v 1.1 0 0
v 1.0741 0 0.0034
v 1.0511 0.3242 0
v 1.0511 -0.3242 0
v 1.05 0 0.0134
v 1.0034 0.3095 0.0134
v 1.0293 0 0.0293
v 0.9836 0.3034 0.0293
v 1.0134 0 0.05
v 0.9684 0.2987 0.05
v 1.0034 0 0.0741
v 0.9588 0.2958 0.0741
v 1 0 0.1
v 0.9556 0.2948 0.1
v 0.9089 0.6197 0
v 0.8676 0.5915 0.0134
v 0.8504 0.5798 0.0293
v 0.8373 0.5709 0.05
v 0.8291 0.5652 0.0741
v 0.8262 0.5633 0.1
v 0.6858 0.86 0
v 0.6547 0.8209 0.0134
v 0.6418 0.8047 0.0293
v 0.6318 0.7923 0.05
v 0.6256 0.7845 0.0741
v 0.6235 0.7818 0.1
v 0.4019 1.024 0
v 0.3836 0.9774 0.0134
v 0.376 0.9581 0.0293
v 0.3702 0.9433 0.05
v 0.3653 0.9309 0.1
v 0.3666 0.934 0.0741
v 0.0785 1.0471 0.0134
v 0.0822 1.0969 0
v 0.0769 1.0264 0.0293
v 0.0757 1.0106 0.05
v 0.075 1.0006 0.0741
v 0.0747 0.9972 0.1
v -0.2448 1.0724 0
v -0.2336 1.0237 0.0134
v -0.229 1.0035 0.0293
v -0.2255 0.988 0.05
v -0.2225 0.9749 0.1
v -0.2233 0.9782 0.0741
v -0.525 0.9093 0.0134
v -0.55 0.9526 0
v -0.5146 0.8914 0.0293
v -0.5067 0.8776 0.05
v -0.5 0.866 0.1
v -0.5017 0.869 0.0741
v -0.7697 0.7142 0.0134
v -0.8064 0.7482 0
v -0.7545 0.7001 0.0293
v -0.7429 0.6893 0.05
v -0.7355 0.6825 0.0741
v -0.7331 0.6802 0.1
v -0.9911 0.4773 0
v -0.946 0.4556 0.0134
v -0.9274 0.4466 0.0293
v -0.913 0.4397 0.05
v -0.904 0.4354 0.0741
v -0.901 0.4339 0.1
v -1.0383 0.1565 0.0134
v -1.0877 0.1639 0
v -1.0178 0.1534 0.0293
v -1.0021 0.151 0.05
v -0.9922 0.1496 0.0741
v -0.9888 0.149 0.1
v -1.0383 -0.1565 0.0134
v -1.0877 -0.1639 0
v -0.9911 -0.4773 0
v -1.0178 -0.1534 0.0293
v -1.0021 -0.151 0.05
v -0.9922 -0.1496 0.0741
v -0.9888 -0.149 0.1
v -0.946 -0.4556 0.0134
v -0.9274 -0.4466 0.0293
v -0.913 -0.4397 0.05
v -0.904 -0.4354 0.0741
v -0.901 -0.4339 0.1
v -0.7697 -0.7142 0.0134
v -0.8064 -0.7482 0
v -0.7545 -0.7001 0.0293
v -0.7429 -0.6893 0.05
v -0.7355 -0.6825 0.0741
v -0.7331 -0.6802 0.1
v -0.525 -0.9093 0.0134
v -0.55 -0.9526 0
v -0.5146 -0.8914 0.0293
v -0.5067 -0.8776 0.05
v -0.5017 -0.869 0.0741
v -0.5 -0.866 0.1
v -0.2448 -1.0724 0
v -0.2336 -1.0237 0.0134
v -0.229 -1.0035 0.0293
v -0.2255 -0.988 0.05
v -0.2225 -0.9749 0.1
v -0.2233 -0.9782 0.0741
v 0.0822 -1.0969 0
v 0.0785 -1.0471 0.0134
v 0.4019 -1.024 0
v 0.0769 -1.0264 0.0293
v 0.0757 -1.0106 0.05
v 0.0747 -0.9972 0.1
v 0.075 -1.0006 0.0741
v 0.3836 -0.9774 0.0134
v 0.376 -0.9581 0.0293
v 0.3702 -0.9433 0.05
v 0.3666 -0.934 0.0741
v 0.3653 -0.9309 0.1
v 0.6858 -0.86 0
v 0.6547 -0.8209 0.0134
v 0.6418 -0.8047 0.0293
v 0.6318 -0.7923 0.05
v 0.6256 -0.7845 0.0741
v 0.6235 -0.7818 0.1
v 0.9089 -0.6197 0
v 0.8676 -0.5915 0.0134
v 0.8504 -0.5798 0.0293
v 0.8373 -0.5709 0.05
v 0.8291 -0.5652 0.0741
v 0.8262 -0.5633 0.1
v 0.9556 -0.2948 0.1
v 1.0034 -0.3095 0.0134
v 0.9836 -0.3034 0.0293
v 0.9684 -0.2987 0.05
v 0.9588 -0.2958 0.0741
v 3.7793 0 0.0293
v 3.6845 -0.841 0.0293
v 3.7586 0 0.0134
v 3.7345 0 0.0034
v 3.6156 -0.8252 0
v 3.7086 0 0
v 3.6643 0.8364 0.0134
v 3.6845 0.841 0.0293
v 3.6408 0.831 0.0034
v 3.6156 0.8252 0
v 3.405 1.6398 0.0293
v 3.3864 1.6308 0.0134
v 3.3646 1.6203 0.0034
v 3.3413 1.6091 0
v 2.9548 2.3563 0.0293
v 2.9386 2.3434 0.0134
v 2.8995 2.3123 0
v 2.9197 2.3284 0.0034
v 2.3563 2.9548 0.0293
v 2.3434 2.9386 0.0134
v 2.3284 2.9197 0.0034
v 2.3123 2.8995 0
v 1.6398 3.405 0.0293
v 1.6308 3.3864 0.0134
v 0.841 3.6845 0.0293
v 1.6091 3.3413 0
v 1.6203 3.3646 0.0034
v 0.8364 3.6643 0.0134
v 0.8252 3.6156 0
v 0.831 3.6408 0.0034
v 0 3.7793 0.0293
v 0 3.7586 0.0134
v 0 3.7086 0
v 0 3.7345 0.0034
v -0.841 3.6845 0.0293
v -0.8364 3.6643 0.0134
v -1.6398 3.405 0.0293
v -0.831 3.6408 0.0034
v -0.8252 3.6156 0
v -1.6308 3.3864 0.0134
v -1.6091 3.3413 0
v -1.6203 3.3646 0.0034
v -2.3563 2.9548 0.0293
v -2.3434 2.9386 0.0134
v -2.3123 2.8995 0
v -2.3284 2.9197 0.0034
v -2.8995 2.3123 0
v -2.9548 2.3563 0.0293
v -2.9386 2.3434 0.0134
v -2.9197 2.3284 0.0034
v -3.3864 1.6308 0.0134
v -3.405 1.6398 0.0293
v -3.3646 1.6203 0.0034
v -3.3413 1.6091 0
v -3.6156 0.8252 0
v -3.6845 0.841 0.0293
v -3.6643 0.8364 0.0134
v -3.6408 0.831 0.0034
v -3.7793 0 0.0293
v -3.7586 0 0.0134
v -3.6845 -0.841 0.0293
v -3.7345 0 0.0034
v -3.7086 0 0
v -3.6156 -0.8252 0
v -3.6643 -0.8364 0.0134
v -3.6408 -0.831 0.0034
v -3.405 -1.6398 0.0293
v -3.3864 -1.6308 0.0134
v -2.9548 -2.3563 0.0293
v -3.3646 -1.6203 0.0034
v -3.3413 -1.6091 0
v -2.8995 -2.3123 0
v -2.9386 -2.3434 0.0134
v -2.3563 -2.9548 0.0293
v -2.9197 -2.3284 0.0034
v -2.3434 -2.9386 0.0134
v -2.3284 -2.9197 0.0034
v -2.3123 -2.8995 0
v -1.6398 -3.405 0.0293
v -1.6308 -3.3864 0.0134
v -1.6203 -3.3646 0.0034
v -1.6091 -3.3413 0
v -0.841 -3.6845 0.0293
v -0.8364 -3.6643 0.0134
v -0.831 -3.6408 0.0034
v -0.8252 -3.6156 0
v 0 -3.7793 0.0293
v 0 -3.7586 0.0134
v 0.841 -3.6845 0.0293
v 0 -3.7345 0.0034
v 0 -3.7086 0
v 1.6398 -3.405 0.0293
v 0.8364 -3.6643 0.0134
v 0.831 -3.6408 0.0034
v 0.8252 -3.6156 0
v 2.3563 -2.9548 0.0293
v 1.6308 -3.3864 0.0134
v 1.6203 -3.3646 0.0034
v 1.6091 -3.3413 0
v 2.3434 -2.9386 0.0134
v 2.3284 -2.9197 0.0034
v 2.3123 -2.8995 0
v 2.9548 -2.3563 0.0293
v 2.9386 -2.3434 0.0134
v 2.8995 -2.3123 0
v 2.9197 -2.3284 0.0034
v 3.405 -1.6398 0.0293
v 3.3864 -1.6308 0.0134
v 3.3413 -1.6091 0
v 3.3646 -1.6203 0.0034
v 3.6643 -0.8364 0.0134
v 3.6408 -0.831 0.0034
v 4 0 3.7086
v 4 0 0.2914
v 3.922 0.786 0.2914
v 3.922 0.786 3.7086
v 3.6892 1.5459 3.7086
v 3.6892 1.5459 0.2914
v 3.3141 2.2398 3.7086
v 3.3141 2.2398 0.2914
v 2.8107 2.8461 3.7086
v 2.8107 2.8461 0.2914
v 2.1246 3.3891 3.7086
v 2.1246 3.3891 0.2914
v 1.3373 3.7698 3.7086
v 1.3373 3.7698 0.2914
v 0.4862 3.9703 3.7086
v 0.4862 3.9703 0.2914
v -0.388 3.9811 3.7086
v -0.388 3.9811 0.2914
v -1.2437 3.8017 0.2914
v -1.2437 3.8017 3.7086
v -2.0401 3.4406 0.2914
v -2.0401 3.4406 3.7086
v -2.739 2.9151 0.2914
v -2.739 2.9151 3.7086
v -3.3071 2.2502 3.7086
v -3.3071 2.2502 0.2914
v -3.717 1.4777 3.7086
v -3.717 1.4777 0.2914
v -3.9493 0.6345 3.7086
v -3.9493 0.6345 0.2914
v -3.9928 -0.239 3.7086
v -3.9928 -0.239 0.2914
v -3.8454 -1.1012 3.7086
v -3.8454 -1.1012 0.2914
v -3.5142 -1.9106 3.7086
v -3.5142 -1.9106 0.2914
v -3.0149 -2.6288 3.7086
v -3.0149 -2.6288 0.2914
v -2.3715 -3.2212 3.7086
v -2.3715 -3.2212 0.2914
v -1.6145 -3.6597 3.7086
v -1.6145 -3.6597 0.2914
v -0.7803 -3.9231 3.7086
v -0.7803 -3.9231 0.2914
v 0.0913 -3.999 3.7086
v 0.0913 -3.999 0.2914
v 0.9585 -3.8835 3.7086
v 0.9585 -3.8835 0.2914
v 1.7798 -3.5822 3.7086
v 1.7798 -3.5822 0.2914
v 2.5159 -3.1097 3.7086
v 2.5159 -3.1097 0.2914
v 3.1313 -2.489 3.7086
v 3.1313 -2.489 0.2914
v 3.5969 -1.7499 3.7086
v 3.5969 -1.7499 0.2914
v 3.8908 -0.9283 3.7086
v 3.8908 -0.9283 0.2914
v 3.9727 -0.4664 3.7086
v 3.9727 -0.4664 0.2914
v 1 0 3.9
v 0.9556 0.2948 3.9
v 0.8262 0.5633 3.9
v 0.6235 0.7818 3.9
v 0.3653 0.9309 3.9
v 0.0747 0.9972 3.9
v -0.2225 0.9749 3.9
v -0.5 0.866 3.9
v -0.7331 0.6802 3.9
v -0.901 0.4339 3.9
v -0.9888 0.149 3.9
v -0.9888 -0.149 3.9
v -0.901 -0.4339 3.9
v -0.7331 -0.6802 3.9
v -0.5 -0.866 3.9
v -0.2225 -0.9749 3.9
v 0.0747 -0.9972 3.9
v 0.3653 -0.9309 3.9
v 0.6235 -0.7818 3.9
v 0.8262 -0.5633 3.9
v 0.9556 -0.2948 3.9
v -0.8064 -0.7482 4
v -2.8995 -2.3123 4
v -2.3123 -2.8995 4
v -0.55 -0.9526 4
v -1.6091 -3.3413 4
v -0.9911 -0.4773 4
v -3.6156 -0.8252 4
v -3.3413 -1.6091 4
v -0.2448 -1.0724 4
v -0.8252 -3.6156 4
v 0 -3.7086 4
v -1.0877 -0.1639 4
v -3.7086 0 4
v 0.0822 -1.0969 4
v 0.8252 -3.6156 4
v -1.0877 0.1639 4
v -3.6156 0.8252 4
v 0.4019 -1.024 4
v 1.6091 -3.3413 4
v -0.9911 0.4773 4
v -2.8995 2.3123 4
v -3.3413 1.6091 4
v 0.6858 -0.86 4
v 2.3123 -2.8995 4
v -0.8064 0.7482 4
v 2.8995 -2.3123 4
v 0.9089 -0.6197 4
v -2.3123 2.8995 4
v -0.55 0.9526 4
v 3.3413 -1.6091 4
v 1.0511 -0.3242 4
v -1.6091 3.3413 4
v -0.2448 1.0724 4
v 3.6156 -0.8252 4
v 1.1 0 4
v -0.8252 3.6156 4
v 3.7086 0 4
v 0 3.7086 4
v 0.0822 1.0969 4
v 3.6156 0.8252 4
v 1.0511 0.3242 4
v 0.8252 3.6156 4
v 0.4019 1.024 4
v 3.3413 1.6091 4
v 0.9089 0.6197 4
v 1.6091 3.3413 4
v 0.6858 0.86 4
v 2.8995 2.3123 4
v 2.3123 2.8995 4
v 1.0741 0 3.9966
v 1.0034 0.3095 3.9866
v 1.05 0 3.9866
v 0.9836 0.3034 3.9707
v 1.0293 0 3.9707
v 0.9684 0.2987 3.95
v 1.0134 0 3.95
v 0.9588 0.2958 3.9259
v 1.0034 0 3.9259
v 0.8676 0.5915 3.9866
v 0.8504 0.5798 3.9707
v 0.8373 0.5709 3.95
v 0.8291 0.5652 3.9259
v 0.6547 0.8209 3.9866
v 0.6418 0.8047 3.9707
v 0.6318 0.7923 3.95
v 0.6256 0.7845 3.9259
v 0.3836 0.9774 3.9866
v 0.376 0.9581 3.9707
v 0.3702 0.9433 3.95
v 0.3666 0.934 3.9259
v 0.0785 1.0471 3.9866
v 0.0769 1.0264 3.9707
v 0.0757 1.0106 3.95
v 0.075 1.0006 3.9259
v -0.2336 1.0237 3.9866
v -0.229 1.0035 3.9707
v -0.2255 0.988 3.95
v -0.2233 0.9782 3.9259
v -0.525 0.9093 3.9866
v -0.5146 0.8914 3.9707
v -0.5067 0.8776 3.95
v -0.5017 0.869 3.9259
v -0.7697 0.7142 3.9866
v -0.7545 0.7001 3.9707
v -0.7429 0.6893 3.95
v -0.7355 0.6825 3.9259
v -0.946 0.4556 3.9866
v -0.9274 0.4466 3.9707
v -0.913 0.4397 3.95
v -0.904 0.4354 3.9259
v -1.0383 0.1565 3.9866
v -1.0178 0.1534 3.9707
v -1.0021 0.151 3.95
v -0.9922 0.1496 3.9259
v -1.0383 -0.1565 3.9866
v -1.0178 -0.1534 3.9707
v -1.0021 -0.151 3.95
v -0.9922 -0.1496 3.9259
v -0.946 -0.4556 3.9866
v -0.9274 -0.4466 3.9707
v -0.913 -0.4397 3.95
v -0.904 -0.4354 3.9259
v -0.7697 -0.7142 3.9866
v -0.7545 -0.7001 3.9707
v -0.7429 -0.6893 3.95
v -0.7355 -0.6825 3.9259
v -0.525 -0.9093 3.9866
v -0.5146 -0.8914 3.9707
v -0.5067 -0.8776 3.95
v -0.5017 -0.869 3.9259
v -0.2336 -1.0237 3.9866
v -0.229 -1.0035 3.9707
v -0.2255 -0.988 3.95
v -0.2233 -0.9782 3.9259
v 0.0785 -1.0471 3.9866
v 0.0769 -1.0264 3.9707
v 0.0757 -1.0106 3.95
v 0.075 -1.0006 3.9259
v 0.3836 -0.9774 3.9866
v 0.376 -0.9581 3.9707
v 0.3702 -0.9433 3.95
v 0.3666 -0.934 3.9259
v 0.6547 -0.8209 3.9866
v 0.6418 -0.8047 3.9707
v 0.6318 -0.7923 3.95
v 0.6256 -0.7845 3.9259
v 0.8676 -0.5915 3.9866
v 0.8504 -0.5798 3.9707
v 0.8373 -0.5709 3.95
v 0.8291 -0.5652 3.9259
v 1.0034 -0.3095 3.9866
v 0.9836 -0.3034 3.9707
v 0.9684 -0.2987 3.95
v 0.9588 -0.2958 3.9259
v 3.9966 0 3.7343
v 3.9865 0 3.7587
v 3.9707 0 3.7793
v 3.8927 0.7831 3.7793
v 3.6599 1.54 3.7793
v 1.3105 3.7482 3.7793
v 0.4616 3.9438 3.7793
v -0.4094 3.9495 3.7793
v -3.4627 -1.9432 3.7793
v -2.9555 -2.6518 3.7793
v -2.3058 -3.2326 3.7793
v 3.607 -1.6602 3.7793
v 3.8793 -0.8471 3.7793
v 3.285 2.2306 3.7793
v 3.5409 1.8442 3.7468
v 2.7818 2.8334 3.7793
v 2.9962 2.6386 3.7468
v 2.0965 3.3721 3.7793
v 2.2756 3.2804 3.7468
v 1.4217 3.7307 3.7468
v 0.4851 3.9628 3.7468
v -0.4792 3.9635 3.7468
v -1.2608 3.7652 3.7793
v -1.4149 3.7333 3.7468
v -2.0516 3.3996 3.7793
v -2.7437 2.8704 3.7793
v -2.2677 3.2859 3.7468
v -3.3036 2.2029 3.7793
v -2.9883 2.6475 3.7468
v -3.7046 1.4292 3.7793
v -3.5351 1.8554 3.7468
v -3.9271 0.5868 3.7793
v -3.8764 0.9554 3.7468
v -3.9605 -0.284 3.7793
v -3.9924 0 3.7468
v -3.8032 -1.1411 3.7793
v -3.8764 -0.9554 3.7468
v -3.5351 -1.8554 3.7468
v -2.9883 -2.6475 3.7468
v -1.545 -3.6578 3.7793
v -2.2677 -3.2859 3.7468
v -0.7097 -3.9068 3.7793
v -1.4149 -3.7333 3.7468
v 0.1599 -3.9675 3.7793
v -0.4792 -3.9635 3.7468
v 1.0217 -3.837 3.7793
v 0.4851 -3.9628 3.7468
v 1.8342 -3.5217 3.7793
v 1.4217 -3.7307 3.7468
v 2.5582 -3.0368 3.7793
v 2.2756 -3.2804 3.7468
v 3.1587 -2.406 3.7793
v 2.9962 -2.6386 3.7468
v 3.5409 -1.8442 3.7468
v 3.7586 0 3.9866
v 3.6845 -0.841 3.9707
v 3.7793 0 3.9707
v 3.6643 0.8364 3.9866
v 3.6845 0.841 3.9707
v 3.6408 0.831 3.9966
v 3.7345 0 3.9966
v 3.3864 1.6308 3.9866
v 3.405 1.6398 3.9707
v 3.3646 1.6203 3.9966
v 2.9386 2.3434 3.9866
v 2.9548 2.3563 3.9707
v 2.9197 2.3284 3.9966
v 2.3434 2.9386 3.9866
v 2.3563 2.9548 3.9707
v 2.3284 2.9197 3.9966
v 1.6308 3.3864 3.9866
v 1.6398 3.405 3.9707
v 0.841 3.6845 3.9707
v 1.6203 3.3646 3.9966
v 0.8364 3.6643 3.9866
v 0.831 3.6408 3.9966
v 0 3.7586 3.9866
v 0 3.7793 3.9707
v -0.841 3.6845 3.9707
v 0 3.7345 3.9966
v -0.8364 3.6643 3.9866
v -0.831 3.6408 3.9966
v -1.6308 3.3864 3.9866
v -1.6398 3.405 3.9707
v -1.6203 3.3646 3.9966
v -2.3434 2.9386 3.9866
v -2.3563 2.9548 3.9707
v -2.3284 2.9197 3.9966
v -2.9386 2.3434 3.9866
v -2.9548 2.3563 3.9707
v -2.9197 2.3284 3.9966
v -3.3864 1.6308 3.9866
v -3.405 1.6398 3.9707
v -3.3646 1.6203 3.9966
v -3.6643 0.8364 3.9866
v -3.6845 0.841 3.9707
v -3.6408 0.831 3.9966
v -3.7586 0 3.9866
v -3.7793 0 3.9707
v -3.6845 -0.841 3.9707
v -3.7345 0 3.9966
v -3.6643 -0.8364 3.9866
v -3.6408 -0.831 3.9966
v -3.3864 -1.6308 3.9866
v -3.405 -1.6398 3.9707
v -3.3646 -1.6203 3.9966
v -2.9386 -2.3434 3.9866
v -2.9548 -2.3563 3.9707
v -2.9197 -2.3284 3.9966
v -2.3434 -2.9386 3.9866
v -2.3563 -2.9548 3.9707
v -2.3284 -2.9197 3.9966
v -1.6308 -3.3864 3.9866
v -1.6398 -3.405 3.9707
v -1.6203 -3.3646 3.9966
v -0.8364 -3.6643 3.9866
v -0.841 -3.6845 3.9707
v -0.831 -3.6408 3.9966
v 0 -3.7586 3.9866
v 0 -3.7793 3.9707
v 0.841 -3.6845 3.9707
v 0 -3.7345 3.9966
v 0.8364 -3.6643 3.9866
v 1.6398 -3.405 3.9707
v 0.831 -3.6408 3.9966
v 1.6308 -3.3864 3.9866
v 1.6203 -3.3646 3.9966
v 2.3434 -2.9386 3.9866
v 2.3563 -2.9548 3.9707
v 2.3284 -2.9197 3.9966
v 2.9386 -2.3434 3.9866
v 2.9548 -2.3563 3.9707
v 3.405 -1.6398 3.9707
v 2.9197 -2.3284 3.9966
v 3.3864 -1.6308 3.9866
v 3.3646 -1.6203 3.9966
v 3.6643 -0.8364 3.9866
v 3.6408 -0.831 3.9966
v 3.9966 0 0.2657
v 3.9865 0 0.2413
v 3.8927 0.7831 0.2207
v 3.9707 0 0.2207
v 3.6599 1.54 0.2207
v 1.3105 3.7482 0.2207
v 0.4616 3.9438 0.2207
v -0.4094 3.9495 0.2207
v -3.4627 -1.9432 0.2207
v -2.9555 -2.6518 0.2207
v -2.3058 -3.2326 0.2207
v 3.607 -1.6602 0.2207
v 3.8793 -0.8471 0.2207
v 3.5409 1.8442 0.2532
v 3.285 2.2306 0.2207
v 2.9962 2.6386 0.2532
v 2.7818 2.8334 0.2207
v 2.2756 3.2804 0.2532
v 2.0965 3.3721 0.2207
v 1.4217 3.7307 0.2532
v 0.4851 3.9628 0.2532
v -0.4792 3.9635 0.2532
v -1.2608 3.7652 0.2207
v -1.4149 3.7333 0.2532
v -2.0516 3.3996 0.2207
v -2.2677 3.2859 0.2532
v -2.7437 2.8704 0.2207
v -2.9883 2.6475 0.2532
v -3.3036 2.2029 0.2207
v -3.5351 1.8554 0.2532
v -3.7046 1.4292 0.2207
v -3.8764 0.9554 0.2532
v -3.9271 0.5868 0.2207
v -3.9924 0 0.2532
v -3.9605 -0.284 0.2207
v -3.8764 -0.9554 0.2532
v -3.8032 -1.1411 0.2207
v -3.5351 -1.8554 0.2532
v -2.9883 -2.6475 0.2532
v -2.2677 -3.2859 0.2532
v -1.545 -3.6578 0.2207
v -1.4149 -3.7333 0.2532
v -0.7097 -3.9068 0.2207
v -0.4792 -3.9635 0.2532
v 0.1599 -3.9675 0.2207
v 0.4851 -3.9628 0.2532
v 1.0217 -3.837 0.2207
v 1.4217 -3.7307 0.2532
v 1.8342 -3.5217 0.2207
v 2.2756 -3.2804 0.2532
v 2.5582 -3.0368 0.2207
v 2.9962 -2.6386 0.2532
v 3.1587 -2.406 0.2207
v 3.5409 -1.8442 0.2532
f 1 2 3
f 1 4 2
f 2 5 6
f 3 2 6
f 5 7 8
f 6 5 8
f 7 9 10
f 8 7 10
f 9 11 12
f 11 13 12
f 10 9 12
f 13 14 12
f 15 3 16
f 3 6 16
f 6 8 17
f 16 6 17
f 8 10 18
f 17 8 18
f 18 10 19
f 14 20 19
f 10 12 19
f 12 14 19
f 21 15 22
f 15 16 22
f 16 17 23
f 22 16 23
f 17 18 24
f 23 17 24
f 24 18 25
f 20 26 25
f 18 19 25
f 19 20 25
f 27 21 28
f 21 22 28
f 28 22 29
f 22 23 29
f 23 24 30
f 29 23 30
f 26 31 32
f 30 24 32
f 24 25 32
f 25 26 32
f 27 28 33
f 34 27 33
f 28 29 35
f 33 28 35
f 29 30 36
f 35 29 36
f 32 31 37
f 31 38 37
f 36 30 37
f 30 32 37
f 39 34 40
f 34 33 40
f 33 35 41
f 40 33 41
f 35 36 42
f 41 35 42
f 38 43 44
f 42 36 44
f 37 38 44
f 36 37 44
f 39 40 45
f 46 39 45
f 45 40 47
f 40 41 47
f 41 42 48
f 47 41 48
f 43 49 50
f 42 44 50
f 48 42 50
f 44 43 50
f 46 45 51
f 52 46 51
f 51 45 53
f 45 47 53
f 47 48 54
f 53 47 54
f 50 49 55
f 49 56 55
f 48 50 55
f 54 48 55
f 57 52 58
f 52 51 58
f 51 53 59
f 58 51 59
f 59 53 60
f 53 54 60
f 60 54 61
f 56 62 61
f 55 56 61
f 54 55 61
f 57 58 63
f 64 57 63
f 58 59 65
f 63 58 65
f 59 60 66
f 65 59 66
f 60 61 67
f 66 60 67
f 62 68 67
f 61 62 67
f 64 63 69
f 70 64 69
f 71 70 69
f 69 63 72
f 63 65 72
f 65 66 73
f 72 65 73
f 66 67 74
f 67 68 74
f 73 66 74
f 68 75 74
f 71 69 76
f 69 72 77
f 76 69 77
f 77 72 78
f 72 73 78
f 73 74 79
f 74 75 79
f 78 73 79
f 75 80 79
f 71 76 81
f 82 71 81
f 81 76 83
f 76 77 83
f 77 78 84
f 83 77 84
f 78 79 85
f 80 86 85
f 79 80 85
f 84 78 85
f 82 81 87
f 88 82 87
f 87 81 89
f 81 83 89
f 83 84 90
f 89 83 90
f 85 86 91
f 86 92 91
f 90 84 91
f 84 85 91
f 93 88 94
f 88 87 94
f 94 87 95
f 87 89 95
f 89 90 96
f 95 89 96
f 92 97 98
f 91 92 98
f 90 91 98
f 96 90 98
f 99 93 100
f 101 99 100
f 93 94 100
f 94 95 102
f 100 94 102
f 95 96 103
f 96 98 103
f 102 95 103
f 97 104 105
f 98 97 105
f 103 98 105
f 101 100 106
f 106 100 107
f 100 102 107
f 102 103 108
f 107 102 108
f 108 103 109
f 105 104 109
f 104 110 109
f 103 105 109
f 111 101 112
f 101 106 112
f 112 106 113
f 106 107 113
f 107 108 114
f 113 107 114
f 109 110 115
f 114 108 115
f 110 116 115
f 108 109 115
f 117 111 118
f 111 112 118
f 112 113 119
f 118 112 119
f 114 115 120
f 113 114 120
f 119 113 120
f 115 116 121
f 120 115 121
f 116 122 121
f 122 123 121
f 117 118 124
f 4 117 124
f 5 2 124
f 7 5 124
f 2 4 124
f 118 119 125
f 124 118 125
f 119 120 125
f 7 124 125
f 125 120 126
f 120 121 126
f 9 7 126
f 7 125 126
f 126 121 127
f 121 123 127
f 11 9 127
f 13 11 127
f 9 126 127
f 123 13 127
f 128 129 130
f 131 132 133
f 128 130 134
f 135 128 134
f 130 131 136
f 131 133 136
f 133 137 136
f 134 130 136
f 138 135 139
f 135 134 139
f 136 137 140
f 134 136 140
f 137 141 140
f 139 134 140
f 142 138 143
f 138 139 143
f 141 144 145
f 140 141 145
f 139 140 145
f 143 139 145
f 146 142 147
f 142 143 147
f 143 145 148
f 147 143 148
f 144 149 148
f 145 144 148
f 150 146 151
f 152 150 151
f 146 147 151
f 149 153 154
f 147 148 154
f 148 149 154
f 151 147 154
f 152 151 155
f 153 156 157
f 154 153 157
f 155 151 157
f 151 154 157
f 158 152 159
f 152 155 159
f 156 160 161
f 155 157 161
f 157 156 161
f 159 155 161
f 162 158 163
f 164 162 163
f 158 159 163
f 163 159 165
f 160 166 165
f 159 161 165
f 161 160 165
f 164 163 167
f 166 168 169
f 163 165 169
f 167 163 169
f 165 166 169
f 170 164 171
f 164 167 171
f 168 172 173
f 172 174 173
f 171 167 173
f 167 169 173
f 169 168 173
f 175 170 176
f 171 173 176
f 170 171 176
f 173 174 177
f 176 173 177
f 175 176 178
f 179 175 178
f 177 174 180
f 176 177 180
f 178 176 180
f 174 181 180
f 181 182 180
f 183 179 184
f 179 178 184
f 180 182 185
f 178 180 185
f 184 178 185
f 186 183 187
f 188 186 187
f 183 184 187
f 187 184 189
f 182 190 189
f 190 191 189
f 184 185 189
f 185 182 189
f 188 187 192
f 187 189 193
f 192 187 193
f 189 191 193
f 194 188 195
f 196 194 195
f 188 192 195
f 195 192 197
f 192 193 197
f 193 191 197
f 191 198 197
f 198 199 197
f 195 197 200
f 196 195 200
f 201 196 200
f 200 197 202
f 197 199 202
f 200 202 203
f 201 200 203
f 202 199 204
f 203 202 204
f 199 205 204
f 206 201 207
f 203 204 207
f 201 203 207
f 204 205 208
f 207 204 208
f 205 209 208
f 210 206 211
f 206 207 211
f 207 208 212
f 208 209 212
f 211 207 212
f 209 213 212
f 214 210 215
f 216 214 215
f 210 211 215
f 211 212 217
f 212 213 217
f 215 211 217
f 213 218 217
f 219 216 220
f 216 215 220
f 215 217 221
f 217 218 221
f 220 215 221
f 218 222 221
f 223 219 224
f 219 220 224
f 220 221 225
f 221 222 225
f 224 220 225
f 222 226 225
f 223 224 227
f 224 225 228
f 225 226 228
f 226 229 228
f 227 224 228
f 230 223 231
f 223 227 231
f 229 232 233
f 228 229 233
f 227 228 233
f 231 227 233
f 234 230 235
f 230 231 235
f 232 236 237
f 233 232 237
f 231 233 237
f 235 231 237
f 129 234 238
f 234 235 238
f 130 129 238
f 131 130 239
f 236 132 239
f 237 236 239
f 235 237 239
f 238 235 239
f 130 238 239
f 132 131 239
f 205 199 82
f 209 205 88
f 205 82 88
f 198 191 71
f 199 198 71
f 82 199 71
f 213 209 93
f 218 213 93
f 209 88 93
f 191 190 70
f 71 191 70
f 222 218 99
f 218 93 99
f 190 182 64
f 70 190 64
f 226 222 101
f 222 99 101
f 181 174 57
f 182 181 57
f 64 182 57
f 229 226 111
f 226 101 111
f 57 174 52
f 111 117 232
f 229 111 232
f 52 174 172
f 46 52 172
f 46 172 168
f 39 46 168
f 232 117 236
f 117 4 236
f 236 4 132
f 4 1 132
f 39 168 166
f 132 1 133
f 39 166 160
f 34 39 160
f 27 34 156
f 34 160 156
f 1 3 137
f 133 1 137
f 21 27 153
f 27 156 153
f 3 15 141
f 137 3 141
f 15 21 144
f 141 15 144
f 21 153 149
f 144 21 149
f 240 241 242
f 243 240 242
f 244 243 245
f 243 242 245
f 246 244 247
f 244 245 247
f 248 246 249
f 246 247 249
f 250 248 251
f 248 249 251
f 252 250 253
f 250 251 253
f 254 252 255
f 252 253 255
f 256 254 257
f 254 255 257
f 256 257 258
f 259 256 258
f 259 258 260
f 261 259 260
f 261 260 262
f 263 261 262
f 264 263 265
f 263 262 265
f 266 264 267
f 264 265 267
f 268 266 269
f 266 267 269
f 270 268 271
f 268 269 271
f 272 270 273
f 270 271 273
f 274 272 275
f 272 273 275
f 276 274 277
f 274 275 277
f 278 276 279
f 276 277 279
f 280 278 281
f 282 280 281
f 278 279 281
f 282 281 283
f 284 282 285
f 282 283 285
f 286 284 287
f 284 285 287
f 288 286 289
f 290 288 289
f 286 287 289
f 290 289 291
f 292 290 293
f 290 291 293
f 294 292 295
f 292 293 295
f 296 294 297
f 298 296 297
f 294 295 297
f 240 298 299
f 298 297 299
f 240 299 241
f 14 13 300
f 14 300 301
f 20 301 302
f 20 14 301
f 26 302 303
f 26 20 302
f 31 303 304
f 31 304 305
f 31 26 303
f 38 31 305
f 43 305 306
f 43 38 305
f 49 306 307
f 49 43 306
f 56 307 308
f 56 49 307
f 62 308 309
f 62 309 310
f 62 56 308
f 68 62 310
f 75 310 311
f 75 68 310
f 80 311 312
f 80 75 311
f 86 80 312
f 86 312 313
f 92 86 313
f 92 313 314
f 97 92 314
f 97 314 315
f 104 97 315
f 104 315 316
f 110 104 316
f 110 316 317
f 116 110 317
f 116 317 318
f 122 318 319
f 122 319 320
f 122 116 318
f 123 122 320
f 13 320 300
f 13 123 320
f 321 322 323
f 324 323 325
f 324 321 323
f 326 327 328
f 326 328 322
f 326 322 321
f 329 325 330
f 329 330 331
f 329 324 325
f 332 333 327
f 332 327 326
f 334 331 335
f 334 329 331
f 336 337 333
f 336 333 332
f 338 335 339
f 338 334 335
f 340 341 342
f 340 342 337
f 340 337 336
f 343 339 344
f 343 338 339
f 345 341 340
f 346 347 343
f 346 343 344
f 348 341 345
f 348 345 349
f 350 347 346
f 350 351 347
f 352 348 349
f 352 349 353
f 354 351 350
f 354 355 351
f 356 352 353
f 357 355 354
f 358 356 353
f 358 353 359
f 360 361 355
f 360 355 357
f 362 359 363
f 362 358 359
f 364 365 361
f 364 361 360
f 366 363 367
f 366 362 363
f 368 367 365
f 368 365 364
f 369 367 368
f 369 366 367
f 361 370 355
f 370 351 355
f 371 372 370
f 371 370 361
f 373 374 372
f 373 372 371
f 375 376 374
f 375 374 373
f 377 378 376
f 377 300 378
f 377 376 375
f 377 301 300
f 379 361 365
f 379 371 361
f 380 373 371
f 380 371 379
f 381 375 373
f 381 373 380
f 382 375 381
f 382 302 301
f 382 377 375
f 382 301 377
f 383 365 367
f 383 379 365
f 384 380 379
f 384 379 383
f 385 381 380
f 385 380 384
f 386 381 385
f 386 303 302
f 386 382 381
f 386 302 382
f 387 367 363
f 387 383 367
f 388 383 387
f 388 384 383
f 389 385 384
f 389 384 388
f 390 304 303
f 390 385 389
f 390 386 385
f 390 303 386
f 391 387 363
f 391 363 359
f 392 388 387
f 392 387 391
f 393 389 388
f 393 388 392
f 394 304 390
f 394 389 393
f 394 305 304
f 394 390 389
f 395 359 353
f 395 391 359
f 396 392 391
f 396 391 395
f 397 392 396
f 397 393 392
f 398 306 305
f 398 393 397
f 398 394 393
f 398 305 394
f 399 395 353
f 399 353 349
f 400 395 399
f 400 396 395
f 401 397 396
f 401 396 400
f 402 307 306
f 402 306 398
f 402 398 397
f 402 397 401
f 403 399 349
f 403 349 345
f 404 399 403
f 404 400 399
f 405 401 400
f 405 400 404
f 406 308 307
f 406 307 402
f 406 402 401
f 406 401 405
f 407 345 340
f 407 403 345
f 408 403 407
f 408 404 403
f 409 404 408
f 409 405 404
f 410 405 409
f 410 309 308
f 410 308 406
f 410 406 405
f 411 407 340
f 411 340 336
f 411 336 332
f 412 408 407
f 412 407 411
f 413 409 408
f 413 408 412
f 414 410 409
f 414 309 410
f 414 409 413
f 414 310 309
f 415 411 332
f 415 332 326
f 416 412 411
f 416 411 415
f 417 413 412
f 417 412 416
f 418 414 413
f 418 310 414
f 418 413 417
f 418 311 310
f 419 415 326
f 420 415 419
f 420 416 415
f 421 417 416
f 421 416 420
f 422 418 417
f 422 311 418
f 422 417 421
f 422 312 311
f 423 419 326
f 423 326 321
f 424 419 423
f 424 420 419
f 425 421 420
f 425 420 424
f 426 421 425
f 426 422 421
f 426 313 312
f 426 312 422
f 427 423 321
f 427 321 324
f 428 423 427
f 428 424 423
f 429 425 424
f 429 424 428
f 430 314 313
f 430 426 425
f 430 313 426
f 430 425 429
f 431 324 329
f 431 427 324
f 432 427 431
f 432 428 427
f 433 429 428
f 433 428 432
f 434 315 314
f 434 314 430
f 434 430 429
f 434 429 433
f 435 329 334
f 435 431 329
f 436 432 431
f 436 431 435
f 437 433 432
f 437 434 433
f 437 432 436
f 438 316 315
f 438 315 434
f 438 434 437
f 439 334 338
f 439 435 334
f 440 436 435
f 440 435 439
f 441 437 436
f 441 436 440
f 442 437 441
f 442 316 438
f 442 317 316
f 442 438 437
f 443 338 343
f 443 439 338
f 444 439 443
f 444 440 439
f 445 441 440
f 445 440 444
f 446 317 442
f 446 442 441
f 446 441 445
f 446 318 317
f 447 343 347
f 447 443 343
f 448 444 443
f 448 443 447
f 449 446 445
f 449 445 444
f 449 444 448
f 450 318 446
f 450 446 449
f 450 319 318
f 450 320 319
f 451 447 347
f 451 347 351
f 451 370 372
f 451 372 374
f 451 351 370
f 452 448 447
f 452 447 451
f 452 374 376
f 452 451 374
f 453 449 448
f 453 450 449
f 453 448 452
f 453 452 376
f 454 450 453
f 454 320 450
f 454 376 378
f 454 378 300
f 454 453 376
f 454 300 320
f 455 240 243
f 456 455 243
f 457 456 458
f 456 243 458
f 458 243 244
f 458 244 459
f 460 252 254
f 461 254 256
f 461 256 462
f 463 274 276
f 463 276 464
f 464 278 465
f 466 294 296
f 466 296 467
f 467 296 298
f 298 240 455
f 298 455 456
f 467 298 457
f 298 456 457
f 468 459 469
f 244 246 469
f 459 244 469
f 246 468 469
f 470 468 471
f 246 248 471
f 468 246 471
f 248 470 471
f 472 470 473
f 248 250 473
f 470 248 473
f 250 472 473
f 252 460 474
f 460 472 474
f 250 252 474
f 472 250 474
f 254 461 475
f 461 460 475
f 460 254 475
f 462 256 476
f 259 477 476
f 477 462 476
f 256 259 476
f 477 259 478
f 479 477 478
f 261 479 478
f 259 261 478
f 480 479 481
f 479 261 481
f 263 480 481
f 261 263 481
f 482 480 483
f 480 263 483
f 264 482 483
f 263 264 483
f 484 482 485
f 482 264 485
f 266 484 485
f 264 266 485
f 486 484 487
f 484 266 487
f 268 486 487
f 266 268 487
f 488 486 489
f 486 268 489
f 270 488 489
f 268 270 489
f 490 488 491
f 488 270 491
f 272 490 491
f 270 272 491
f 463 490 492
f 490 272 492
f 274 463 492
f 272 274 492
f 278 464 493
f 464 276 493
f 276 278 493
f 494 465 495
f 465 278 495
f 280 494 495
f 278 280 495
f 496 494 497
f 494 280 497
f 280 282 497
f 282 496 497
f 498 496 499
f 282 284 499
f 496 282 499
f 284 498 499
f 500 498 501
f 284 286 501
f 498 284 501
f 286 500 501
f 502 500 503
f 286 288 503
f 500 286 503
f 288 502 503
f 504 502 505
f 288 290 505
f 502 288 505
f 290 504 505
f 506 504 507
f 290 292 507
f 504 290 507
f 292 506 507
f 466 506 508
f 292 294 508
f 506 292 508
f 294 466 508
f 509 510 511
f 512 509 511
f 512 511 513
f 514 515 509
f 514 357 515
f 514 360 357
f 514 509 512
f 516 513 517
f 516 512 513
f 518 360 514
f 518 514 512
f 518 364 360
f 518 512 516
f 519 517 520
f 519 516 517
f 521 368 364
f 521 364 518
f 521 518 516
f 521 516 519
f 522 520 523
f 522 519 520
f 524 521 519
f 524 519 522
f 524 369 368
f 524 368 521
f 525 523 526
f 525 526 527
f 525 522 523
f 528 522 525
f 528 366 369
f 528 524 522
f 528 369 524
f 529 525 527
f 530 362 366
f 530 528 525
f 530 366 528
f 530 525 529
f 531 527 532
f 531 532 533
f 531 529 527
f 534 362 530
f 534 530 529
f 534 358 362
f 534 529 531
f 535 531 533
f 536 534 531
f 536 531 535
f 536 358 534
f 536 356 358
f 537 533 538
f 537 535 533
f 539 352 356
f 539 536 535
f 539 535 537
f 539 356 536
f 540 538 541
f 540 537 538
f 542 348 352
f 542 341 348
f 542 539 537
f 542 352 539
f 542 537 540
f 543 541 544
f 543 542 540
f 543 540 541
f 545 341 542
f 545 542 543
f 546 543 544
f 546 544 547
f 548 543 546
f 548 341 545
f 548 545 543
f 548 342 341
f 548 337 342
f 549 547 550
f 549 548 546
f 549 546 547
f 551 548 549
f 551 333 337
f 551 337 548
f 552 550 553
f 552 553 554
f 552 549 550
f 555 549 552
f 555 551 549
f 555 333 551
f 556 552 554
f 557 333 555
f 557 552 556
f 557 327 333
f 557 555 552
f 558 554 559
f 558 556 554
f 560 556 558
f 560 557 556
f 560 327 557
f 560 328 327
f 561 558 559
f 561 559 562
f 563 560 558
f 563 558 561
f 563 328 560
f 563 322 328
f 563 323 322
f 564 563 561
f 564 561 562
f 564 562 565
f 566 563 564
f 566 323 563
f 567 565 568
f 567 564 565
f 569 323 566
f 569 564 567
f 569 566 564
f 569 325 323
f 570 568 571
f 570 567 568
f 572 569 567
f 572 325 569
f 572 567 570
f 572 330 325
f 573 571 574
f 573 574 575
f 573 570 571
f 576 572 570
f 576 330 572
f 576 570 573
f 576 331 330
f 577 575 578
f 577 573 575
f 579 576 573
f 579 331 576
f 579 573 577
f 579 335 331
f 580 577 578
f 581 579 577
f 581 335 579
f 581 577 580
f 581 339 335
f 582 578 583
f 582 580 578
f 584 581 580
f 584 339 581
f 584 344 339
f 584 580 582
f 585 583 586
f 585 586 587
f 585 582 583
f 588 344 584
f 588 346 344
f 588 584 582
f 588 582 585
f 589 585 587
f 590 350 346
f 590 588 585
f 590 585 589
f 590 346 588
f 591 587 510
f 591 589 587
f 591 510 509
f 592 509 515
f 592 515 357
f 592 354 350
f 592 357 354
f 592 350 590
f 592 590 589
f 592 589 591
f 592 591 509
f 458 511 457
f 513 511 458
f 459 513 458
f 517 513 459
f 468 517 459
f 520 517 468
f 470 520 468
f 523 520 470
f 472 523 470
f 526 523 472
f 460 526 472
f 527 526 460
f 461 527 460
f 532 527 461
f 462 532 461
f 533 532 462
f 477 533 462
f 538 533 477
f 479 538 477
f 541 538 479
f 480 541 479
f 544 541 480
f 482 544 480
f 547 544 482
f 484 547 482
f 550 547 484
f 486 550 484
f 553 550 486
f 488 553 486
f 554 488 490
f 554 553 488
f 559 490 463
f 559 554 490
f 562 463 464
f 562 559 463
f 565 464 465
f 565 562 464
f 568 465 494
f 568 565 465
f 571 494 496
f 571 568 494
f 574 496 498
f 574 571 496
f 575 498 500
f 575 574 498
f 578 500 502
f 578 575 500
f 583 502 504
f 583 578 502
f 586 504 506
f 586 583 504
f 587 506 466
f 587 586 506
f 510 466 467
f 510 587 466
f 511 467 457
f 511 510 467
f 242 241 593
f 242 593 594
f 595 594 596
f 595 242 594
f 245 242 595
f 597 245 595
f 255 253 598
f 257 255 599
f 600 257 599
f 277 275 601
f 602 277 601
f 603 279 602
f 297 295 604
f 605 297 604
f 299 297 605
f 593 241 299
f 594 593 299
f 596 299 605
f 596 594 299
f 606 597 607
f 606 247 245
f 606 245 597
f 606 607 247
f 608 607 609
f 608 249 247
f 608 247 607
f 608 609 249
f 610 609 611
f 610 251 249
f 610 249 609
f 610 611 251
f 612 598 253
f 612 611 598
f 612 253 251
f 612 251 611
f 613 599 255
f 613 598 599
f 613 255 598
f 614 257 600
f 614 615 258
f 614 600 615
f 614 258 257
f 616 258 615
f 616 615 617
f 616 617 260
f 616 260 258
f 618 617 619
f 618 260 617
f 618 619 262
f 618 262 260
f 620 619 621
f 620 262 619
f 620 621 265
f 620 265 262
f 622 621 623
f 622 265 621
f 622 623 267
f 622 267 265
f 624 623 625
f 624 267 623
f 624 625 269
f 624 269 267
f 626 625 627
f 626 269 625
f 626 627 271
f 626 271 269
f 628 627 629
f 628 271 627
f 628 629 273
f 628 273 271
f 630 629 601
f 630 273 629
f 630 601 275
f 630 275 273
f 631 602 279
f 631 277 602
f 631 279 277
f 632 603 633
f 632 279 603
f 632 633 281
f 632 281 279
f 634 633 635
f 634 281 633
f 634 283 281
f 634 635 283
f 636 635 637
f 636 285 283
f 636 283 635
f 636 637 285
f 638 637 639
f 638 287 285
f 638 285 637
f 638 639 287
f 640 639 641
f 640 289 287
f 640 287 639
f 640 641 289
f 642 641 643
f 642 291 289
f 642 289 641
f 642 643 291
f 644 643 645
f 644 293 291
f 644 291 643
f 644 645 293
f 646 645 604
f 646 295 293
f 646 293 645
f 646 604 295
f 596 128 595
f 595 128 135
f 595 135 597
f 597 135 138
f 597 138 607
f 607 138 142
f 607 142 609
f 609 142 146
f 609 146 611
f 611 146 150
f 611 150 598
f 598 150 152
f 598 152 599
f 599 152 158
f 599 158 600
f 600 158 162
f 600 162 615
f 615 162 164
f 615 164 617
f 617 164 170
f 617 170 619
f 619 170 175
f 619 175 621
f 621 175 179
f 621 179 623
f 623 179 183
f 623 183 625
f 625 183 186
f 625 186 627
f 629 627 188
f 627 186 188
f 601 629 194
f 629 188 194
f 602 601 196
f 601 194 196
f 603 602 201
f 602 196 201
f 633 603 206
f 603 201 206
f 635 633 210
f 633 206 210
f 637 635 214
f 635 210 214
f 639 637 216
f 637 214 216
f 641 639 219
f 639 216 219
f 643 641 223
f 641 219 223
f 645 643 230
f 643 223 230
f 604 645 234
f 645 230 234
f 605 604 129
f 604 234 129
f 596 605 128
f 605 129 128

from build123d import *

# Parameters (mm, degrees)
SKETCH2_R           = 4
SKETCH2_R_2         = 1
BOSS_EXTRUDE1_DEPTH = 4
CHAMFER1_SIZE       = 0.25
FILLET1_R           = 0.1


with BuildPart() as part:
    # Sketch2 → Boss-Extrude1 (new body)
    with BuildSketch(Plane.XY):
        Circle(SKETCH2_R)
        Circle(SKETCH2_R_2, mode=Mode.SUBTRACT)
    extrude(amount=BOSS_EXTRUDE1_DEPTH)

    # Chamfer1
    chamfer1_edges = [part.edges().sort_by_distance(p)[0] for p in [
        (-4, 0, 0),
        (-4, 0, 4),
    ]]
    chamfer(chamfer1_edges, length=CHAMFER1_SIZE)

    # Fillet1
    fillet1_edges = [part.edges().sort_by_distance(p)[0] for p in [
        (-4, 0, 0.25),
        (-3.75, 0, 0),
        (-3.75, 0, 4),
        (-1, 0, 0),
        (-1, 0, 4),
        (-4, 0, 3.75),
    ]]
    fillet(fillet1_edges, radius=FILLET1_R)


solid = part.part
